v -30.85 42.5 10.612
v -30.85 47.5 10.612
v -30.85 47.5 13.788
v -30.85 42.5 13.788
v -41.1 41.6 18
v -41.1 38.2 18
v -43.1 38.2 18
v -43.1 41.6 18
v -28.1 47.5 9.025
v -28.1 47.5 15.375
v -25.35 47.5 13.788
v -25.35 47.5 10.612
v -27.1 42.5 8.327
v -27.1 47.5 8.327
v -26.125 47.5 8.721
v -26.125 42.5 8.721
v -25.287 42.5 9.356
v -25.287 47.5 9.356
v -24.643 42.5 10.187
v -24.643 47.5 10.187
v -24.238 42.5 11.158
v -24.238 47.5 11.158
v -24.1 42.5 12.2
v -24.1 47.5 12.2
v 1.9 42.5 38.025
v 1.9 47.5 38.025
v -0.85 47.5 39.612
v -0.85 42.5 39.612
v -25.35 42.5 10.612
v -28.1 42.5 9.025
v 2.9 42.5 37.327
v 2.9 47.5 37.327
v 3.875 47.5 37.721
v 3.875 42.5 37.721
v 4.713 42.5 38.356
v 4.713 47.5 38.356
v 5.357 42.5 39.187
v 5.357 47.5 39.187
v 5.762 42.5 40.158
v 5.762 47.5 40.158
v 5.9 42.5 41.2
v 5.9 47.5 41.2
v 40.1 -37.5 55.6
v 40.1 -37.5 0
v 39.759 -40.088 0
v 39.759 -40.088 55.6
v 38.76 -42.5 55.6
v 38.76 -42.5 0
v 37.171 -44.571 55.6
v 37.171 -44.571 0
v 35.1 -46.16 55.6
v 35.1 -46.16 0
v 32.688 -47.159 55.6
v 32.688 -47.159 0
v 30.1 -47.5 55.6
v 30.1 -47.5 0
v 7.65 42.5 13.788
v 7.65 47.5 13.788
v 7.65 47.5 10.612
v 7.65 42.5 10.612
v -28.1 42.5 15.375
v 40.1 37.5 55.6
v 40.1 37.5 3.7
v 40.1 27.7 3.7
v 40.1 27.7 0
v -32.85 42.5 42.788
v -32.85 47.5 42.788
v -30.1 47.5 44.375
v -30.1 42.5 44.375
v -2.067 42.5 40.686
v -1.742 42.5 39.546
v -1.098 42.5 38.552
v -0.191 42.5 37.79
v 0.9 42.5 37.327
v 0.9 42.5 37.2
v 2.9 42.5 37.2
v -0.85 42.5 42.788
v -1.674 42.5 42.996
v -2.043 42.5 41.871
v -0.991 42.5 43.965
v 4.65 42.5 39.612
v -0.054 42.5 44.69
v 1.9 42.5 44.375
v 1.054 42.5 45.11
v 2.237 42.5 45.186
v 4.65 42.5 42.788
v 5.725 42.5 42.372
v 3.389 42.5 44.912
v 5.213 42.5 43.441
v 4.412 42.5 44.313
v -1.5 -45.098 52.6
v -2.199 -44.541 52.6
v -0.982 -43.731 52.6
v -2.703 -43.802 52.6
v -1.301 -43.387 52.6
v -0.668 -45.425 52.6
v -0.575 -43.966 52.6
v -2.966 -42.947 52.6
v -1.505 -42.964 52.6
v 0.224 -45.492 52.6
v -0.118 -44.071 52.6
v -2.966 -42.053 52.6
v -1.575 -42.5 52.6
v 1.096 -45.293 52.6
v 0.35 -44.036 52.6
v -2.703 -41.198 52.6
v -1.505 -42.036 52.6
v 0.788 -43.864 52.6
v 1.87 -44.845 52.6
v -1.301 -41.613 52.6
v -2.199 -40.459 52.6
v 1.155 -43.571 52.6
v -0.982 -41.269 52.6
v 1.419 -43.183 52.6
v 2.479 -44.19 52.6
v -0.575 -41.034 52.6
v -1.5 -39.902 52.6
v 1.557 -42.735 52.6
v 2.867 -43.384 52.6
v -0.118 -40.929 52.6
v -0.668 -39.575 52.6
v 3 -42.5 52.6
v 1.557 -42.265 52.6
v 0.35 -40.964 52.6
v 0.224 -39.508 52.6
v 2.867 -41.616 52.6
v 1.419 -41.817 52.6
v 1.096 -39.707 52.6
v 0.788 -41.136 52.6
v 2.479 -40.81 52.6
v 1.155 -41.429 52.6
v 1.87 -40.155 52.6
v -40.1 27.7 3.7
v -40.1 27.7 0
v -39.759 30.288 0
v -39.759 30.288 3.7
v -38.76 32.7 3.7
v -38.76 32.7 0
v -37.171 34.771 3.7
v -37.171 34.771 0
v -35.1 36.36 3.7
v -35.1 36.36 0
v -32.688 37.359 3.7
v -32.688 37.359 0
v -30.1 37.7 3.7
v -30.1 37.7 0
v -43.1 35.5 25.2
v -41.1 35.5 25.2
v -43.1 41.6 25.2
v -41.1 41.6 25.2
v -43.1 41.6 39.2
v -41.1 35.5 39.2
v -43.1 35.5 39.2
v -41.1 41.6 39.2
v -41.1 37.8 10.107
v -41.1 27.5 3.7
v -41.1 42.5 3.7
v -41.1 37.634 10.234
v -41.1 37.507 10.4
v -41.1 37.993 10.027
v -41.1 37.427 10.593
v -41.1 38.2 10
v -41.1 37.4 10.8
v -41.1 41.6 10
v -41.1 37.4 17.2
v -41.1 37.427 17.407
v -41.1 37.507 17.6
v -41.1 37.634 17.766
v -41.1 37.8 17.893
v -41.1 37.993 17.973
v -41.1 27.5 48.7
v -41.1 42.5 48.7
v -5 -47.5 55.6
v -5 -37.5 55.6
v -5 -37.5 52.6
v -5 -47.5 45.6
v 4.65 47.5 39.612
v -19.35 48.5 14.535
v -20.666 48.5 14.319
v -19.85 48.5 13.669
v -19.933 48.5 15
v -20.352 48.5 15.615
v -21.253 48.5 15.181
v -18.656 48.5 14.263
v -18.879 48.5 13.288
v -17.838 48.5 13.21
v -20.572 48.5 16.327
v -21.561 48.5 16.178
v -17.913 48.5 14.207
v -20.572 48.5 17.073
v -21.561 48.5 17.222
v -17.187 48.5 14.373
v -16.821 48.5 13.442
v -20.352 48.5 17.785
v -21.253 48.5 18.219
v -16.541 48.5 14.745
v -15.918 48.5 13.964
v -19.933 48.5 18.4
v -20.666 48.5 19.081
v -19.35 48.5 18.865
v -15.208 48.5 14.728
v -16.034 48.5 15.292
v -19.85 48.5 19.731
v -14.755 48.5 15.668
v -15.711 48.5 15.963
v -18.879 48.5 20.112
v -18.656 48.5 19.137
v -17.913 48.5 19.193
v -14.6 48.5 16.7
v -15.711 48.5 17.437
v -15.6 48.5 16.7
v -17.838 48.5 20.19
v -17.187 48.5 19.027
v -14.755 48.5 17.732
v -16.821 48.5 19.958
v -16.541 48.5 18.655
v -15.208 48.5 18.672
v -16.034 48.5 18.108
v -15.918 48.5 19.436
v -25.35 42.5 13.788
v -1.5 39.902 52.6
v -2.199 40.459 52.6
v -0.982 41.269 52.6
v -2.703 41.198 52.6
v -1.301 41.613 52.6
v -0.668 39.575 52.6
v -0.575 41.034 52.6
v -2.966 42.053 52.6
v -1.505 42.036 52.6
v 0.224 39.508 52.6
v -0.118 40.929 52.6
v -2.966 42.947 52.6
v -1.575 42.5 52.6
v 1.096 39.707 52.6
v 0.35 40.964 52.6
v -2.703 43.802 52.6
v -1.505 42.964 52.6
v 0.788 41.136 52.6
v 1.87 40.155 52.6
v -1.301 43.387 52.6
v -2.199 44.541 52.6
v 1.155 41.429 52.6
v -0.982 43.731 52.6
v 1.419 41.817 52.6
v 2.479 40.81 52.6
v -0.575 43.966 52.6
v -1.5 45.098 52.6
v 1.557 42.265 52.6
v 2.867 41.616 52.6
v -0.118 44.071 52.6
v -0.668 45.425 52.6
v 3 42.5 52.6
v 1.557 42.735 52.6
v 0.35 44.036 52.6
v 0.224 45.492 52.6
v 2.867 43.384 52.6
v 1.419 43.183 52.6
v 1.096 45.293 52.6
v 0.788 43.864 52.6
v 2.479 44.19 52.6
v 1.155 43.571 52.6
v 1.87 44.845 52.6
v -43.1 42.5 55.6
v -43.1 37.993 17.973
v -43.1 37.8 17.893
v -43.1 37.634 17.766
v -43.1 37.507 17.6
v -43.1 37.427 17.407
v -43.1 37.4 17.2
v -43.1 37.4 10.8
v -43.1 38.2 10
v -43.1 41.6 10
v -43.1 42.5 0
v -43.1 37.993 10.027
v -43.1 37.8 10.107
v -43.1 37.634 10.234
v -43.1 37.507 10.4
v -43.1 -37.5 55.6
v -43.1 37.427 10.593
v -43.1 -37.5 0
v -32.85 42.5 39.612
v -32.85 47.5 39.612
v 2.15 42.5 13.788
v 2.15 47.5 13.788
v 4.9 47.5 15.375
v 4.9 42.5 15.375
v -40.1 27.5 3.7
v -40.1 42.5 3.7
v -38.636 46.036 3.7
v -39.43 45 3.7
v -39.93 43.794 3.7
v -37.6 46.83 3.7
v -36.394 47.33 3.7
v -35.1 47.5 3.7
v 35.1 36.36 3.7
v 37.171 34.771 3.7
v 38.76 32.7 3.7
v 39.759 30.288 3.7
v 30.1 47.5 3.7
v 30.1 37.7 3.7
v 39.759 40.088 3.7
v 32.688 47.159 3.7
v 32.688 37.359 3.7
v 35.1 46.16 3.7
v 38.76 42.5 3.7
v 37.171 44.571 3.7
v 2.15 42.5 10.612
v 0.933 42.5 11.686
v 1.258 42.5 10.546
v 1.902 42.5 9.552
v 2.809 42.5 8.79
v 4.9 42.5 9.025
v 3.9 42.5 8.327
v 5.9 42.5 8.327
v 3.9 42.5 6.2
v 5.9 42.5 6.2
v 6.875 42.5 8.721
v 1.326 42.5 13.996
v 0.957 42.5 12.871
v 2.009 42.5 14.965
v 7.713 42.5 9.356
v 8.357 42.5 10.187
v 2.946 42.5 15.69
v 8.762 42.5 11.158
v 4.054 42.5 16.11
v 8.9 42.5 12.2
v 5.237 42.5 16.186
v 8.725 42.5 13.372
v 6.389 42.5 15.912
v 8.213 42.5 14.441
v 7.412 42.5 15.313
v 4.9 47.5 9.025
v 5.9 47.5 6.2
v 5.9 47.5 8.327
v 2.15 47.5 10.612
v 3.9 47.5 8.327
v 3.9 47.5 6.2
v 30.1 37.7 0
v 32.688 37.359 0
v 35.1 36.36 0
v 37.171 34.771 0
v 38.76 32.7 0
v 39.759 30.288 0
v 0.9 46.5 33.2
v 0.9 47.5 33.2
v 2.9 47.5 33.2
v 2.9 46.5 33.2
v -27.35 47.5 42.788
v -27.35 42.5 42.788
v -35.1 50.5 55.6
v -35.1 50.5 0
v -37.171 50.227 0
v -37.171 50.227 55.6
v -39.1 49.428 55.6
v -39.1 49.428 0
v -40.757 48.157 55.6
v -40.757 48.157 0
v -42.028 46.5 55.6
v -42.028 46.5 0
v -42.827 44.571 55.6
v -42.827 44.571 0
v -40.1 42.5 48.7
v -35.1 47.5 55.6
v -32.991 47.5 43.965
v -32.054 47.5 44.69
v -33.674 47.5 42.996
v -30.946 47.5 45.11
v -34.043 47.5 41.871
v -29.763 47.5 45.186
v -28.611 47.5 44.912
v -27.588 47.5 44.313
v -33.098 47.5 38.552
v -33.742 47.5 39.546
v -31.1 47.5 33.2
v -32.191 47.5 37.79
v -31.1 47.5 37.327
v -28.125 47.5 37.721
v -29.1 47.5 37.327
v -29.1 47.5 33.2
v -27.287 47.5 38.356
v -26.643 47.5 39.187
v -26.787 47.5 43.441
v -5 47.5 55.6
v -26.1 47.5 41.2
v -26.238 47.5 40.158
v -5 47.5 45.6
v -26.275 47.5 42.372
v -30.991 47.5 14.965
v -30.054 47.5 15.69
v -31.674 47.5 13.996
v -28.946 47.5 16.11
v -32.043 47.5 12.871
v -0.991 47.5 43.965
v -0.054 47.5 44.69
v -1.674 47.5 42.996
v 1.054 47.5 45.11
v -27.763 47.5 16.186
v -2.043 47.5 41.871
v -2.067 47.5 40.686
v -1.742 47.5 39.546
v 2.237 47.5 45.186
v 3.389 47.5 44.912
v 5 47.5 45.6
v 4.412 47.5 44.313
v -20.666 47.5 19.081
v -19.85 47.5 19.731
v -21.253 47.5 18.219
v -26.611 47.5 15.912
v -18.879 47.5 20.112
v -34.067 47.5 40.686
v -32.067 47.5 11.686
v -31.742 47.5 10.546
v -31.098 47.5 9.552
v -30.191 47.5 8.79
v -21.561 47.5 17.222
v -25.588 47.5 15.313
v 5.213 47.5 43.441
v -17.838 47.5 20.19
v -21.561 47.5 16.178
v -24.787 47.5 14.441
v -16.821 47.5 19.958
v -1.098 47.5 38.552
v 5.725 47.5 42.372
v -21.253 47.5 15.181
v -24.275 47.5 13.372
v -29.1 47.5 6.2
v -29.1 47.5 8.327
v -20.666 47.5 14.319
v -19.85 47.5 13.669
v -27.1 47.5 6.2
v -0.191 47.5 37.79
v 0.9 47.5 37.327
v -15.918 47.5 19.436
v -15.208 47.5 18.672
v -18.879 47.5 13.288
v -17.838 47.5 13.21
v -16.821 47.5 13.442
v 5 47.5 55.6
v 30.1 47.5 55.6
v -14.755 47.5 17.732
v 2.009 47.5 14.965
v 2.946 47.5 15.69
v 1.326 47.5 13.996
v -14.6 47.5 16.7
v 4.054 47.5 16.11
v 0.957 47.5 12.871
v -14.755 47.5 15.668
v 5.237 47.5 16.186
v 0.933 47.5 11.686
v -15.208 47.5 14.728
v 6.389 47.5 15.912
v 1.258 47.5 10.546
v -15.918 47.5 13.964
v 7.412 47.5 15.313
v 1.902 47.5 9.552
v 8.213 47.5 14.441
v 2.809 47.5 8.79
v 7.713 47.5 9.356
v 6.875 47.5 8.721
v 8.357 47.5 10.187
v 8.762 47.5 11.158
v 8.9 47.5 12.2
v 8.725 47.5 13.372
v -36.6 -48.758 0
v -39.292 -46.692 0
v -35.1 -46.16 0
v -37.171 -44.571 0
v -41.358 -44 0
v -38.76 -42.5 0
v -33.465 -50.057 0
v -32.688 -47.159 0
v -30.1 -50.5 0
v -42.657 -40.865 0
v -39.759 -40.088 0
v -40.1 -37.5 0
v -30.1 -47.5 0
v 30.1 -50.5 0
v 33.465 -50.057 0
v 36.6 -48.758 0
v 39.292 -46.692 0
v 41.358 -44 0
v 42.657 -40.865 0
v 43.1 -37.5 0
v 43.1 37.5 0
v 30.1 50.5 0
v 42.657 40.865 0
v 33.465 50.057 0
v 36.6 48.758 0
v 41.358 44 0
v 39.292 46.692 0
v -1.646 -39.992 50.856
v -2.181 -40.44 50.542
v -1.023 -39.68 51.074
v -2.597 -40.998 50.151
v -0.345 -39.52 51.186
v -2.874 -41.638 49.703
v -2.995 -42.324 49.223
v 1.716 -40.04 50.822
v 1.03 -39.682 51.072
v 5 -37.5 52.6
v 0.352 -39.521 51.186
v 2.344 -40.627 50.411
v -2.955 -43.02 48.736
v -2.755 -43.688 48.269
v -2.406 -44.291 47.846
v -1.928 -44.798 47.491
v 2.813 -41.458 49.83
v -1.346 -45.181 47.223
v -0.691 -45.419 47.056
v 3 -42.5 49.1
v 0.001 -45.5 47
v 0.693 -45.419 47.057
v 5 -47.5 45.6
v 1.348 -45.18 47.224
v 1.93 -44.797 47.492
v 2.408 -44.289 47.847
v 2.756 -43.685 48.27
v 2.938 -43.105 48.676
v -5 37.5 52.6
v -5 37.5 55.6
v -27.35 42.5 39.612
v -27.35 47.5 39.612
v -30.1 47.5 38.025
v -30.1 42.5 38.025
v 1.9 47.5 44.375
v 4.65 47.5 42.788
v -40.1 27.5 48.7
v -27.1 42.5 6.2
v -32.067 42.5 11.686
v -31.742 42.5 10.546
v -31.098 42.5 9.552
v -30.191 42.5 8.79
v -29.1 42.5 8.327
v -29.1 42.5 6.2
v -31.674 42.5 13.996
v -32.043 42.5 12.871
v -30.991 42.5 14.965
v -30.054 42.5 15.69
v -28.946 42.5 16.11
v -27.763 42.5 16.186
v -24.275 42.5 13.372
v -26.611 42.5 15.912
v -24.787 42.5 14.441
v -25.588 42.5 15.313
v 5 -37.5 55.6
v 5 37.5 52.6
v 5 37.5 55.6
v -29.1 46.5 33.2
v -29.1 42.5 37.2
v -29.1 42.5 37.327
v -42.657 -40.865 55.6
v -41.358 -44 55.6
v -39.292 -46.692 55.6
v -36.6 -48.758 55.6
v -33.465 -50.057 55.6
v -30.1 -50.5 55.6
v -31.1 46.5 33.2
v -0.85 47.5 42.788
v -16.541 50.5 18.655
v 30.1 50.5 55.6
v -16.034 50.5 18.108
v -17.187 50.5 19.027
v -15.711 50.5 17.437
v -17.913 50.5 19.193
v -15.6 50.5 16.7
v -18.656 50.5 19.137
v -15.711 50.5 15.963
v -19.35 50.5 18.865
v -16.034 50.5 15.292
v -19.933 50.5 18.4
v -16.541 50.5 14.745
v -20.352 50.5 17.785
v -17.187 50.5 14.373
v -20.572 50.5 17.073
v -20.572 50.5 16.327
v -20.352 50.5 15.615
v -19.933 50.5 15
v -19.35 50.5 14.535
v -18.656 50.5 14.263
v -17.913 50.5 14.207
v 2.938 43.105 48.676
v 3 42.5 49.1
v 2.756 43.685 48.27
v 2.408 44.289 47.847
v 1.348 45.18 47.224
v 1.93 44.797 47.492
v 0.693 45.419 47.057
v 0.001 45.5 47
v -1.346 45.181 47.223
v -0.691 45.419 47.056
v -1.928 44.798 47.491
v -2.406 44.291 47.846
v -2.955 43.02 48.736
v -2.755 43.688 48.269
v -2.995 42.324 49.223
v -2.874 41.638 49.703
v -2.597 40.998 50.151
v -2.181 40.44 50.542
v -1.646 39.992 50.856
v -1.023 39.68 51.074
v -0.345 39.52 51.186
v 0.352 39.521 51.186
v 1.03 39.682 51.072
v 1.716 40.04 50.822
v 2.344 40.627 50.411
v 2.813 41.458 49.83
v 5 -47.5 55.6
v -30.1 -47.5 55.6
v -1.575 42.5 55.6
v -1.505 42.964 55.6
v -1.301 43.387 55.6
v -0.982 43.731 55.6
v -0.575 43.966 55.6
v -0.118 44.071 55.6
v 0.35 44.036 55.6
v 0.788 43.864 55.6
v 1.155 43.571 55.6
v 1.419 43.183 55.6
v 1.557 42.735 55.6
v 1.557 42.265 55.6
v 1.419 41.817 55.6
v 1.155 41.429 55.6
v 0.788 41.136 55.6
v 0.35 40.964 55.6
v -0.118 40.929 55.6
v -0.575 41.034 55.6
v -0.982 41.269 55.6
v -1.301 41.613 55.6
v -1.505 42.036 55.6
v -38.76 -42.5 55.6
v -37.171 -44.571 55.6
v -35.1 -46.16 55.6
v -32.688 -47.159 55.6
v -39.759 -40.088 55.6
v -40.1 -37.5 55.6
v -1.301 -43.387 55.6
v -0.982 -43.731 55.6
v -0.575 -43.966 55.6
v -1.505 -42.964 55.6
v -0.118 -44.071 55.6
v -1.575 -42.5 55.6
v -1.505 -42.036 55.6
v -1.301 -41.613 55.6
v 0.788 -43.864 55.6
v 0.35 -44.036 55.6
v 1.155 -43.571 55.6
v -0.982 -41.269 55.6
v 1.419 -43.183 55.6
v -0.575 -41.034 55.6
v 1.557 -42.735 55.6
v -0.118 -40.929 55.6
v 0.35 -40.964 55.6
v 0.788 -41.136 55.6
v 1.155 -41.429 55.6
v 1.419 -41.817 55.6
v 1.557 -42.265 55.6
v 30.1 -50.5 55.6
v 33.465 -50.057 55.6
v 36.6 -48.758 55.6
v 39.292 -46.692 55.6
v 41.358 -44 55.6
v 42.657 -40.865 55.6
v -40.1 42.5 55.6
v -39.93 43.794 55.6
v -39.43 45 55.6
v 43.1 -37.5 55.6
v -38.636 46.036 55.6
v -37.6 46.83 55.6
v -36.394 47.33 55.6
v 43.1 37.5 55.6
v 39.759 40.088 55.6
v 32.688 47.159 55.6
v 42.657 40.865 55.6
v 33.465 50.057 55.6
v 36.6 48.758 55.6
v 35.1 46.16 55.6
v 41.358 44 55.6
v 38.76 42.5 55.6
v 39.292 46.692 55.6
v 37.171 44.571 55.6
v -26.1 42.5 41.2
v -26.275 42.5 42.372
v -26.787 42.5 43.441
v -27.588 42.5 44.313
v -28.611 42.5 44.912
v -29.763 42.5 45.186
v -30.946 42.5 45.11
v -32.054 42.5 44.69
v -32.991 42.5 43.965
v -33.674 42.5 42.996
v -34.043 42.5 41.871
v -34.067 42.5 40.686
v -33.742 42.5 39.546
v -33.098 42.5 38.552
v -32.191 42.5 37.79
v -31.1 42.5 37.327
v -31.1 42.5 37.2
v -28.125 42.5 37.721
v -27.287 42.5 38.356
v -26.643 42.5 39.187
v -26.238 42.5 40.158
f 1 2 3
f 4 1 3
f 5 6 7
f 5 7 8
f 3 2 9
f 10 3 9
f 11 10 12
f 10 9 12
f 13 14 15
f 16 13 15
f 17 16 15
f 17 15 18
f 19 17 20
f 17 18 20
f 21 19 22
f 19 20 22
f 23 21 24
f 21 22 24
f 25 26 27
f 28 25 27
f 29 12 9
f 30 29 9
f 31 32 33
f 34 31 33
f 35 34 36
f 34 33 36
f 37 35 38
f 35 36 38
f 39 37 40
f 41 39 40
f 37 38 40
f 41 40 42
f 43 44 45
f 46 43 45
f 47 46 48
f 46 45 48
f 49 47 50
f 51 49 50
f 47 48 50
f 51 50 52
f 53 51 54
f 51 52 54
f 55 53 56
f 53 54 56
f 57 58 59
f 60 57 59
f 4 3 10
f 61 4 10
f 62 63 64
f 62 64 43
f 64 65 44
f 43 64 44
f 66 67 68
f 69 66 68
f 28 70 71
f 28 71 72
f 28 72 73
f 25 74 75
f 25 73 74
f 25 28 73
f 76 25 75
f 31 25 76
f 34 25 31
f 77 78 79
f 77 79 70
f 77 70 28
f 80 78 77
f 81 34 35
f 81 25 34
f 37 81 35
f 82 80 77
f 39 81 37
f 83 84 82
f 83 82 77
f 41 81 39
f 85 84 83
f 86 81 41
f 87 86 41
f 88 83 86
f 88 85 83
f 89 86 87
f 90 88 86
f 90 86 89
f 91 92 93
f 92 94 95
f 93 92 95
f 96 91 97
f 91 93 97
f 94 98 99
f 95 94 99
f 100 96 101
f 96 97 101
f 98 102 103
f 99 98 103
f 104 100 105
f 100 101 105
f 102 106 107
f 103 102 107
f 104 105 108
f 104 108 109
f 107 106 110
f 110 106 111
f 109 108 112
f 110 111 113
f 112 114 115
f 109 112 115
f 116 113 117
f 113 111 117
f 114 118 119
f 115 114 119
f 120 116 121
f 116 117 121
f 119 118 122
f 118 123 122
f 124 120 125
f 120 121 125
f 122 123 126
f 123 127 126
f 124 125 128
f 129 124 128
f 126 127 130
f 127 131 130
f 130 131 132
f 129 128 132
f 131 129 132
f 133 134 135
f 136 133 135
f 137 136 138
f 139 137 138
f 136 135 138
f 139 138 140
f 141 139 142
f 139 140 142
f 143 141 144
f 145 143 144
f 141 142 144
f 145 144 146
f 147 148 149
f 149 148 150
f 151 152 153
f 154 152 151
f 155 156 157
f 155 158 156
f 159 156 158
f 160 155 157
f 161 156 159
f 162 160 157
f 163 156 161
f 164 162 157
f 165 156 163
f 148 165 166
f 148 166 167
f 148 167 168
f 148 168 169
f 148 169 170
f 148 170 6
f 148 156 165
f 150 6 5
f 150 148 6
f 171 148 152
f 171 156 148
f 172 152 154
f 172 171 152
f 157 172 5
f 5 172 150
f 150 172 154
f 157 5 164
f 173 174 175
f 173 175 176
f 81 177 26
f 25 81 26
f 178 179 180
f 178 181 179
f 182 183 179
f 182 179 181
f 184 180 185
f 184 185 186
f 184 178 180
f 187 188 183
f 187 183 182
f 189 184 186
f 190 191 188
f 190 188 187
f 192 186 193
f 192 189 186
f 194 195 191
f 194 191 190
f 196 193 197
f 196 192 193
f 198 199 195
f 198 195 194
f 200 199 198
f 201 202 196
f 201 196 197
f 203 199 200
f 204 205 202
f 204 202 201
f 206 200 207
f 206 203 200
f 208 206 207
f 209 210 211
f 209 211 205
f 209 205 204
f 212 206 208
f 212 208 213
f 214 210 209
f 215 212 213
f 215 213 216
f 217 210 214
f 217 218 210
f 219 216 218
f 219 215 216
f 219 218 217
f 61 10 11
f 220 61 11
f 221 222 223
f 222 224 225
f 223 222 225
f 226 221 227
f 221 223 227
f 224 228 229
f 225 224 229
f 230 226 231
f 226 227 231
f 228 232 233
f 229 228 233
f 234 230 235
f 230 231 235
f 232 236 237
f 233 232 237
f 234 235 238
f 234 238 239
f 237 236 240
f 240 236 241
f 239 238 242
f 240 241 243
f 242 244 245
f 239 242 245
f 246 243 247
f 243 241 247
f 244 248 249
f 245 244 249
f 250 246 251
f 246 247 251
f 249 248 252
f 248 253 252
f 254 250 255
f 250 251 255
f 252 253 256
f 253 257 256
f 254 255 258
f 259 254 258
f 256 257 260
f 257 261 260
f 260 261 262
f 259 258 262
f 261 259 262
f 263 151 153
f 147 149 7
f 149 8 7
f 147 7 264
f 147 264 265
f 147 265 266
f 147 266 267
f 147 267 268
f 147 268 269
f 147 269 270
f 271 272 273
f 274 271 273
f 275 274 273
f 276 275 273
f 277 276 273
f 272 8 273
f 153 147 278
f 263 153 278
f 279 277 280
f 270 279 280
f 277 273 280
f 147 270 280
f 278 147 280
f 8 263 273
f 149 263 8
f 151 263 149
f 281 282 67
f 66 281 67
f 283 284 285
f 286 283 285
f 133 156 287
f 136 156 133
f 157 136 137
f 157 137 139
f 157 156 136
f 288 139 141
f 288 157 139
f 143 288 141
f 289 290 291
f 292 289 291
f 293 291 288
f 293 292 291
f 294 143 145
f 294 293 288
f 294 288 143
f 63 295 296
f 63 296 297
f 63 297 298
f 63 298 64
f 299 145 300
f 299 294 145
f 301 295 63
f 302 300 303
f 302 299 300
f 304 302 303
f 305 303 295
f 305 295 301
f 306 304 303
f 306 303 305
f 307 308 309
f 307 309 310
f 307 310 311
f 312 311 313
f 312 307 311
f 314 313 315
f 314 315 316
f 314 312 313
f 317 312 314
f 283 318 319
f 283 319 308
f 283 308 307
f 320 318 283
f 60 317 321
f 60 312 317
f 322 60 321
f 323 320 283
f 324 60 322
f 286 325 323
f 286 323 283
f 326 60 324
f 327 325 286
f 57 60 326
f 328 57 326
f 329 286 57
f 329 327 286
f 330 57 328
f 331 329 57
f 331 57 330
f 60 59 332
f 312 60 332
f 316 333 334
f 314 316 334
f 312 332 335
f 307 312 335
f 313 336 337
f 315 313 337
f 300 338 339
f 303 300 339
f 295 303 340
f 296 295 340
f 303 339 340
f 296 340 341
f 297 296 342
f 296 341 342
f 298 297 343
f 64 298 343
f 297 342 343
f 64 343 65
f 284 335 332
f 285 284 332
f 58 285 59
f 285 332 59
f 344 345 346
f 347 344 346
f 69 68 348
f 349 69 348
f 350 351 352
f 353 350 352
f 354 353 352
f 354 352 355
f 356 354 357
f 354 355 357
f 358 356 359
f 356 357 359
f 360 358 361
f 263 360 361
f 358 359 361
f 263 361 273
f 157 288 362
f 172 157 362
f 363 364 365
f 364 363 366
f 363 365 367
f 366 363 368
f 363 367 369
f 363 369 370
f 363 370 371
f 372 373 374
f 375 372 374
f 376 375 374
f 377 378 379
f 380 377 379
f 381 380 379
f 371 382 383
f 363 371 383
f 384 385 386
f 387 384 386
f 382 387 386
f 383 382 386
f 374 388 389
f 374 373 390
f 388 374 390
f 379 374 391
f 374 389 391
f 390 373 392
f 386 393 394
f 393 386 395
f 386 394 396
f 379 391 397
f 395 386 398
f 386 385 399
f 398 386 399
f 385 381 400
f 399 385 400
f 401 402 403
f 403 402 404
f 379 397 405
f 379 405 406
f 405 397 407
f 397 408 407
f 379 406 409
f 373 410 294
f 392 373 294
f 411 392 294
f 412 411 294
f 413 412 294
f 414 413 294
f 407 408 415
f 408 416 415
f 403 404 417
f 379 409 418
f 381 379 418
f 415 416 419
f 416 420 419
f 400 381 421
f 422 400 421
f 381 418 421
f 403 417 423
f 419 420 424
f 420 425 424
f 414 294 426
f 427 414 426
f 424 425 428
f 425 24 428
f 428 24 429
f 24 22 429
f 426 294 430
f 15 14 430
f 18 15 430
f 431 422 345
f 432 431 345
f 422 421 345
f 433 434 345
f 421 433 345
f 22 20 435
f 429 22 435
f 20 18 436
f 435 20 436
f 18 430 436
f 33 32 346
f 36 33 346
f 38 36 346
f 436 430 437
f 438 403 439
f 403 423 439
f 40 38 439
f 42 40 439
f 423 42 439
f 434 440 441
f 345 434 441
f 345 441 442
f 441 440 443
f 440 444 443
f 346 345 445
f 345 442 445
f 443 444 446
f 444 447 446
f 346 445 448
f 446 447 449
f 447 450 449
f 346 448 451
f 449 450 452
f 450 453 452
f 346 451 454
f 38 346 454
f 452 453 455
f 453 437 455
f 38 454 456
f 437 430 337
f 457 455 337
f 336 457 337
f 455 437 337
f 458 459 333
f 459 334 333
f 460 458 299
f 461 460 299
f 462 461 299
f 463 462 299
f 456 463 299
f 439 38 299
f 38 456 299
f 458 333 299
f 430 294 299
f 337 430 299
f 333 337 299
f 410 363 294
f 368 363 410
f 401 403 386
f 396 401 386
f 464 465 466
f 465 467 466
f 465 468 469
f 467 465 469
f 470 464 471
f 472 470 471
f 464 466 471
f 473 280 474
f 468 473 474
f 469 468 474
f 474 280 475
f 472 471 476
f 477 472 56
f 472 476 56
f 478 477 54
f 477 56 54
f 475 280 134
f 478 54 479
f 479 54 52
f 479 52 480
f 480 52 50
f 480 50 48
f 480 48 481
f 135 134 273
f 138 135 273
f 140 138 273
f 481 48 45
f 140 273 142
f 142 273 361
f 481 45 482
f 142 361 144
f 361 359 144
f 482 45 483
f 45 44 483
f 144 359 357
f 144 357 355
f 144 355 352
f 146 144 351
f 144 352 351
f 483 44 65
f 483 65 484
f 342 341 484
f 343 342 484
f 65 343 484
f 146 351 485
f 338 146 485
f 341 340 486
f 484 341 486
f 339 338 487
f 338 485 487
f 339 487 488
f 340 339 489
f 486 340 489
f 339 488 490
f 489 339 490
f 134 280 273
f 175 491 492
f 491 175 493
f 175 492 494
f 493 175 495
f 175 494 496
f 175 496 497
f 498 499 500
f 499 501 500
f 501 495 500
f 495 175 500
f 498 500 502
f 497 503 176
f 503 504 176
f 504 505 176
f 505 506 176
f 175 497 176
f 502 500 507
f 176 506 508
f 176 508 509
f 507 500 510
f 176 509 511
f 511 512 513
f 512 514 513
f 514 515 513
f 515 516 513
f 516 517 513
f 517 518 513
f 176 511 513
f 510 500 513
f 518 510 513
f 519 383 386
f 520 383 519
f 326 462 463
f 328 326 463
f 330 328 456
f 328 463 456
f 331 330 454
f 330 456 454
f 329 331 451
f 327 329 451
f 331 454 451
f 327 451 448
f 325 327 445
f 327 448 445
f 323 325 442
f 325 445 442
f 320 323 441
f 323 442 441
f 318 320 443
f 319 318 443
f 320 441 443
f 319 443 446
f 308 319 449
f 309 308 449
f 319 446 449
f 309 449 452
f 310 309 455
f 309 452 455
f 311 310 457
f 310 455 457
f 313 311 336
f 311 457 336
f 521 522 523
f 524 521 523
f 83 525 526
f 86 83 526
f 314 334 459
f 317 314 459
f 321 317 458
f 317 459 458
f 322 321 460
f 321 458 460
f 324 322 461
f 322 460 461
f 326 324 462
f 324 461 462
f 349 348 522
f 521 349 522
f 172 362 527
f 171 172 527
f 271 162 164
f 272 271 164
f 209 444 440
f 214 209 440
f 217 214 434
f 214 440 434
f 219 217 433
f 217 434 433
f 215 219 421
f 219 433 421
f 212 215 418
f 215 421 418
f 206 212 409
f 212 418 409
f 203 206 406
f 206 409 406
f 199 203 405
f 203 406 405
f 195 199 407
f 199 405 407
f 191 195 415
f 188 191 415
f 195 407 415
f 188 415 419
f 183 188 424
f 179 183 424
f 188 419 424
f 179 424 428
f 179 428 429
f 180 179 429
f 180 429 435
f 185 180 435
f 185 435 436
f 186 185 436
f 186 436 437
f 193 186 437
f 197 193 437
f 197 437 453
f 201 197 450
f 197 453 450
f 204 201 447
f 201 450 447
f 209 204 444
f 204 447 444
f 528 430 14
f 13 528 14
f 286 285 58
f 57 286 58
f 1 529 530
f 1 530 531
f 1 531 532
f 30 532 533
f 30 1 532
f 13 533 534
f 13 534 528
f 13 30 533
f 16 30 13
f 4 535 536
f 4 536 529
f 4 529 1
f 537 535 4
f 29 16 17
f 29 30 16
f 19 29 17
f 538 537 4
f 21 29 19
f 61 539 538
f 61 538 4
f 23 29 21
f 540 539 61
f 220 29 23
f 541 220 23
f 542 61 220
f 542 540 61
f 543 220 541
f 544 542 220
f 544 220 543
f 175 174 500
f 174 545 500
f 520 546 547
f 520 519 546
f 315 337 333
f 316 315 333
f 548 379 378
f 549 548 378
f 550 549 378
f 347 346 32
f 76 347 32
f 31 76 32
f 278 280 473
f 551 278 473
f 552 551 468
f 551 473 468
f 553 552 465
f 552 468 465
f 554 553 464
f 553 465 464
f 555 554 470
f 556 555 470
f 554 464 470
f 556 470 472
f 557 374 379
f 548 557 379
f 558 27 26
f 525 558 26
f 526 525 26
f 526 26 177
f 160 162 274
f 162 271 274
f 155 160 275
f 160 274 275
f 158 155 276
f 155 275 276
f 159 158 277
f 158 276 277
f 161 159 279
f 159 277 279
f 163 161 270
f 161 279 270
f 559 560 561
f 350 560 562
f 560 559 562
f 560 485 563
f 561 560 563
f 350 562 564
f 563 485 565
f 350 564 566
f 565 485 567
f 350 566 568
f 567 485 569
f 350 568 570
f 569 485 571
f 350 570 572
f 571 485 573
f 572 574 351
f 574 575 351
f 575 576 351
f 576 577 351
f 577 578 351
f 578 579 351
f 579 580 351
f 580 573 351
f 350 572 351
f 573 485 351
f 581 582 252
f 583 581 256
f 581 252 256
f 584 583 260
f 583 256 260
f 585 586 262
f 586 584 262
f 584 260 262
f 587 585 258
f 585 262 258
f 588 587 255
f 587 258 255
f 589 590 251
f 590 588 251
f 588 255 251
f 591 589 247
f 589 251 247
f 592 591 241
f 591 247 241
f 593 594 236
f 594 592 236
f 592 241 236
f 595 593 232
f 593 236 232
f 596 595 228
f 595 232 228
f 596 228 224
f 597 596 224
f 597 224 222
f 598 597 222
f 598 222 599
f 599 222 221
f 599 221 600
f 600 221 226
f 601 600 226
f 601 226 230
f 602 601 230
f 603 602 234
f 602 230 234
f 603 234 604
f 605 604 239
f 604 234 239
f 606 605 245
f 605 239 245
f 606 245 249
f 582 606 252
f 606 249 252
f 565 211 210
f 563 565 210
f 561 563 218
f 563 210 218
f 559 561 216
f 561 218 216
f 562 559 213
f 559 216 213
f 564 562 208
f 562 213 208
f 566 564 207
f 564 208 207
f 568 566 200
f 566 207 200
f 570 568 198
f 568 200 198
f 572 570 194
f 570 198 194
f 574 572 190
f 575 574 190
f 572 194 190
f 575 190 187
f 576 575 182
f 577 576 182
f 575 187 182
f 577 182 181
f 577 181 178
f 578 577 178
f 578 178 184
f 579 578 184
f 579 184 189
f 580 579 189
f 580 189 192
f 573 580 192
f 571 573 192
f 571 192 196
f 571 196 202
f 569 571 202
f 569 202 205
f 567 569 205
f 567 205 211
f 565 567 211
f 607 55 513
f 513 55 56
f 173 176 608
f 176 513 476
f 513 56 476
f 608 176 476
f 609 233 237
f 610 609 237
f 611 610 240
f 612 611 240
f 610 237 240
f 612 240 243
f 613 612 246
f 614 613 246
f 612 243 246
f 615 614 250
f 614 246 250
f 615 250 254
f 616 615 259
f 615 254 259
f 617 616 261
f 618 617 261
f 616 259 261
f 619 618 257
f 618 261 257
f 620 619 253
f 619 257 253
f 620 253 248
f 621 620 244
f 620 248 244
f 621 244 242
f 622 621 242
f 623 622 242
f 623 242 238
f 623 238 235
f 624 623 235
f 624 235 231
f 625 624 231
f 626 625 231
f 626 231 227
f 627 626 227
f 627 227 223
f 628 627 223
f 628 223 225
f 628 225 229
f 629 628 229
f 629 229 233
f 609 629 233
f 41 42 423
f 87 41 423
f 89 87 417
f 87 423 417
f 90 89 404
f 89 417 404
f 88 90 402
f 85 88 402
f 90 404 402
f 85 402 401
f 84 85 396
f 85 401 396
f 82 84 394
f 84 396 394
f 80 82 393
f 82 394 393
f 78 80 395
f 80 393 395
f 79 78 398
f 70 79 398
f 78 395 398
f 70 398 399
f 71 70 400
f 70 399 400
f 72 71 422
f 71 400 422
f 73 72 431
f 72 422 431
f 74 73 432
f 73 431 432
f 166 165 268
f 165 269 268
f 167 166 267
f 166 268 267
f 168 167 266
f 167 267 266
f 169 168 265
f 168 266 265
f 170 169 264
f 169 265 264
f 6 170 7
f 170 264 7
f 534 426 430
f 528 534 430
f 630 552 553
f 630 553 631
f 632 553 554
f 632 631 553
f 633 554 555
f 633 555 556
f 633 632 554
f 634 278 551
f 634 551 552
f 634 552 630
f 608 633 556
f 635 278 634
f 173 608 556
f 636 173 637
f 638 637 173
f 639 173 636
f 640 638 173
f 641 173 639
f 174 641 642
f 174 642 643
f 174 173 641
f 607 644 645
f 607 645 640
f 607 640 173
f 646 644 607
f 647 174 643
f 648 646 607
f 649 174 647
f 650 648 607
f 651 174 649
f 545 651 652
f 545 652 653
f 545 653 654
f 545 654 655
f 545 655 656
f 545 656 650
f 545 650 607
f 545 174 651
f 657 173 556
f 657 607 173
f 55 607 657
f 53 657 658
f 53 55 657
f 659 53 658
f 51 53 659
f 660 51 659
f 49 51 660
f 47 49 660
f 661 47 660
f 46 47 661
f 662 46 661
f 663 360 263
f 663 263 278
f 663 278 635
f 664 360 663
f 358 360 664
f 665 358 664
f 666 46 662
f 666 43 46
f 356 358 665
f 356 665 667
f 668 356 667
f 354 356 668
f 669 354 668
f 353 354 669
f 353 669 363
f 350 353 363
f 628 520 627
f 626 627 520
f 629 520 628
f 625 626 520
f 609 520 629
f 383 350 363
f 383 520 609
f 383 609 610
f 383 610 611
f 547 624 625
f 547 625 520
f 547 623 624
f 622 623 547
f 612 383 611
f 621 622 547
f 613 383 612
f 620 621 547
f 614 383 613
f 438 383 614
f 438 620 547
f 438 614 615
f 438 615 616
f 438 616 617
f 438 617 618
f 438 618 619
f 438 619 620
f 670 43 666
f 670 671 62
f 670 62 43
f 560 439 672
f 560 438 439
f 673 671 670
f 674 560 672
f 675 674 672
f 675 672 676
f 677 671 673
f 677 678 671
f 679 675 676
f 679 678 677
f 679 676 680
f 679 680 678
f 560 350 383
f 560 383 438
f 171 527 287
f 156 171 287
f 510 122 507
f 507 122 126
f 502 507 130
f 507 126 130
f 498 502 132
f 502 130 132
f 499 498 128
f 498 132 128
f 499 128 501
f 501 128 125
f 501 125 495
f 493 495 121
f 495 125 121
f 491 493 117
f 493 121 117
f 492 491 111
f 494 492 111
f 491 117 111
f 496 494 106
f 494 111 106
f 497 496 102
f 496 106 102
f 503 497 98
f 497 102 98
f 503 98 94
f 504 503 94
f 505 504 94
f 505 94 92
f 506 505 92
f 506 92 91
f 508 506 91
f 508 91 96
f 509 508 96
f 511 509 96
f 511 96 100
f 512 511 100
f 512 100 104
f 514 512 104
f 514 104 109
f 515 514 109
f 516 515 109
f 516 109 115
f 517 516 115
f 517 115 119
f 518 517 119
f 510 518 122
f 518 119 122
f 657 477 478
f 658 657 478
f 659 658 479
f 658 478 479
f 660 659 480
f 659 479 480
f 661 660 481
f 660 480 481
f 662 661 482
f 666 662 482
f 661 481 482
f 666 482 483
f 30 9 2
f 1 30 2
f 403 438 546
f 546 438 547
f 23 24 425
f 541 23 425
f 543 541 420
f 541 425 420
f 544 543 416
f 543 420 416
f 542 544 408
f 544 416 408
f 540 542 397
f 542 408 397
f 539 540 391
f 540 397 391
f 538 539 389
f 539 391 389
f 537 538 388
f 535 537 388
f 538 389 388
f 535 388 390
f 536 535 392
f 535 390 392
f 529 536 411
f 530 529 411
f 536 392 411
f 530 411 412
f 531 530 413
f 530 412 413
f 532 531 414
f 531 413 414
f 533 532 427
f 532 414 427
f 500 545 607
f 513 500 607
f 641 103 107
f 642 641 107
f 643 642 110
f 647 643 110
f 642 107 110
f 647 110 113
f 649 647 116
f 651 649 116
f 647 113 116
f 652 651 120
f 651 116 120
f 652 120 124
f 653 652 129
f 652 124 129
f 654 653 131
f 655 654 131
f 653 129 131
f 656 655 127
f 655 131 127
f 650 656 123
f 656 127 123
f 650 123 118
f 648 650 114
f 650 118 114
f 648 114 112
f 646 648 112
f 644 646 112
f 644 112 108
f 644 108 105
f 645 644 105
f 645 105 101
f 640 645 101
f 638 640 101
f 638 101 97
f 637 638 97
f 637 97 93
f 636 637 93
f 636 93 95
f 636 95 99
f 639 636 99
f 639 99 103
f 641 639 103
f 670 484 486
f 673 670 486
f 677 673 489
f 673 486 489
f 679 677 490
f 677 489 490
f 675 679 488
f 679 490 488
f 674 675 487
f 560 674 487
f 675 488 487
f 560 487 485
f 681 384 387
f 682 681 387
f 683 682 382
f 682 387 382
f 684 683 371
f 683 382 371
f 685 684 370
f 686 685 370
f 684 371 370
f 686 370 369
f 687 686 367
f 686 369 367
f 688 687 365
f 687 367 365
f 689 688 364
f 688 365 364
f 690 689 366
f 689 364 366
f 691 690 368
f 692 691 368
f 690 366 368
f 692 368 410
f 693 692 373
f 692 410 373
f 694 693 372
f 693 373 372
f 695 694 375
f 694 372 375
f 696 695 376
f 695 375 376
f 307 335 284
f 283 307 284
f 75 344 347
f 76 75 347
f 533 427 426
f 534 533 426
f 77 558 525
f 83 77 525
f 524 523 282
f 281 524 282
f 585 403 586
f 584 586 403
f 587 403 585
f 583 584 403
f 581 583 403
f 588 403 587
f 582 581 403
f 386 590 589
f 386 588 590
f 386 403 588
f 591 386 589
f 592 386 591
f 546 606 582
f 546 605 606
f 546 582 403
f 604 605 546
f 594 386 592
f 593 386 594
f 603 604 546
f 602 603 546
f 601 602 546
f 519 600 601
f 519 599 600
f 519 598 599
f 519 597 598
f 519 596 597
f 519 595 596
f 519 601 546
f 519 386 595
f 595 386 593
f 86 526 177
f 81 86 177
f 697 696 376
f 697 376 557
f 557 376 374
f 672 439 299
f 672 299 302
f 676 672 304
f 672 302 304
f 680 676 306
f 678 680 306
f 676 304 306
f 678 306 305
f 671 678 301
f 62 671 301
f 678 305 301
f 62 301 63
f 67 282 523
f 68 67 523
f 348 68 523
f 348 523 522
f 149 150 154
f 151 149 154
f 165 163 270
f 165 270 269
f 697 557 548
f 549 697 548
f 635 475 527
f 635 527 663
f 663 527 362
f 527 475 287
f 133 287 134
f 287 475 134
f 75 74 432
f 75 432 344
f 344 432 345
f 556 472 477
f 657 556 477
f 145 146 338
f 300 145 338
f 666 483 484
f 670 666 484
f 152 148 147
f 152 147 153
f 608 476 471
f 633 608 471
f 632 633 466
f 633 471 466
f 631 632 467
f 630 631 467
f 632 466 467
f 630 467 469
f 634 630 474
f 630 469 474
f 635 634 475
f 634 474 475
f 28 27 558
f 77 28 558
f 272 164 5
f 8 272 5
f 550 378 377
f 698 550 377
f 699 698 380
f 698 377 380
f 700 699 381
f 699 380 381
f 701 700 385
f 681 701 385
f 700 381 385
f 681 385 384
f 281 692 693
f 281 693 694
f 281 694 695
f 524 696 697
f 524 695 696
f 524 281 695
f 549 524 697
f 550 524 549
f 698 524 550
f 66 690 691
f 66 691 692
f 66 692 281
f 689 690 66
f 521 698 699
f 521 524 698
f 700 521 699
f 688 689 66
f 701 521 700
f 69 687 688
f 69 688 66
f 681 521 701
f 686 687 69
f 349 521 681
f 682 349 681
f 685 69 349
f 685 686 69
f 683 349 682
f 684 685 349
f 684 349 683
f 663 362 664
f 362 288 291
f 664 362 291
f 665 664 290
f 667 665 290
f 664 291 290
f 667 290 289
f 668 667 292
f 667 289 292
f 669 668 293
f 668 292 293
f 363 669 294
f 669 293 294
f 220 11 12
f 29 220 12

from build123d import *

# Parameters (mm, degrees)
F1_DEPTH  = 3.7
F2_DEPTH  = 55.6
F5_DEPTH  = 5
F7_D      = 3.15
F7_DEPTH  = 10
F7_TIP    = 0.946355475
F9_R      = 3
F10_DEPTH = 10
F12_DEPTH = 5
F11_R     = 2.5
F13_DEPTH = 25
F11_R_2   = 3.5
F14_DEPTH = 1
F15_SIZE  = 4
F16_W     = 4.2
F16_H     = 8
F16_W_2   = 6.1
F16_H_2   = 14
F17_DEPTH = 1
F18_DEPTH = 3
F19_R     = 0.8


with BuildPart() as f1:
    # F0 (on Top) → F1 (new body)
    with BuildSketch(Plane.XY):
        with BuildLine():
            ThreePointArc((43.1, 37.5), (39.2923881554, 46.6923881554), (30.1, 50.5))
            Line((30.1, 50.5), (-35.1, 50.5))
            ThreePointArc((-35.1, 50.5), (-40.7568542495, 48.1568542495), (-43.1, 42.5))
            Line((-43.1, 42.5), (-43.1, -37.5))
            ThreePointArc((-43.1, -37.5), (-39.2923881554, -46.6923881554), (-30.1, -50.5))
            Line((-30.1, -50.5), (30.1, -50.5))
            ThreePointArc((30.1, -50.5), (39.2923881554, -46.6923881554), (43.1, -37.5))
            Line((43.1, -37.5), (43.1, 37.5))
        make_face()
        with BuildLine():
            Line((40.1, 37.5), (40.1, 27.7))
            Line((40.1, 27.7), (40.1, -37.5))
            ThreePointArc((40.1, -37.5), (37.1710678119, -44.5710678119), (30.1, -47.5))
            Line((30.1, -47.5), (-30.1, -47.5))
            ThreePointArc((-30.1, -47.5), (-37.1710678119, -44.5710678119), (-40.1, -37.5))
            Line((-40.1, -37.5), (-40.1, 27.7))
            Line((-40.1, 27.7), (-40.1, 42.5))
            ThreePointArc((-40.1, 42.5), (-38.6355339059, 46.0355339059), (-35.1, 47.5))
            Line((-35.1, 47.5), (30.1, 47.5))
            ThreePointArc((30.1, 47.5), (37.1710678119, 44.5710678119), (40.1, 37.5))
        make_face(mode=Mode.SUBTRACT)
        with BuildLine():
            Line((-30.1, 37.7), (30.1, 37.7))
            ThreePointArc((30.1, 37.7), (37.1710678119, 34.7710678119), (40.1, 27.7))
            Line((40.1, 27.7), (40.1, 37.5))
            ThreePointArc((40.1, 37.5), (37.1710678119, 44.5710678119), (30.1, 47.5))
            Line((30.1, 47.5), (-35.1, 47.5))
            ThreePointArc((-35.1, 47.5), (-38.6355339059, 46.0355339059), (-40.1, 42.5))
            Line((-40.1, 42.5), (-40.1, 27.7))
            ThreePointArc((-40.1, 27.7), (-37.1710678119, 34.7710678119), (-30.1, 37.7))
        make_face()
    extrude(amount=F1_DEPTH)

    # F0 (on Top) → F2 (join)
    with BuildSketch(Plane.XY):
        with BuildLine():
            ThreePointArc((43.1, 37.5), (39.2923881554, 46.6923881554), (30.1, 50.5))
            Line((30.1, 50.5), (-35.1, 50.5))
            ThreePointArc((-35.1, 50.5), (-40.7568542495, 48.1568542495), (-43.1, 42.5))
            Line((-43.1, 42.5), (-43.1, -37.5))
            ThreePointArc((-43.1, -37.5), (-39.2923881554, -46.6923881554), (-30.1, -50.5))
            Line((-30.1, -50.5), (30.1, -50.5))
            ThreePointArc((30.1, -50.5), (39.2923881554, -46.6923881554), (43.1, -37.5))
            Line((43.1, -37.5), (43.1, 37.5))
        make_face()
        with BuildLine():
            Line((40.1, 37.5), (40.1, 27.7))
            Line((40.1, 27.7), (40.1, -37.5))
            ThreePointArc((40.1, -37.5), (37.1710678119, -44.5710678119), (30.1, -47.5))
            Line((30.1, -47.5), (-30.1, -47.5))
            ThreePointArc((-30.1, -47.5), (-37.1710678119, -44.5710678119), (-40.1, -37.5))
            Line((-40.1, -37.5), (-40.1, 27.7))
            Line((-40.1, 27.7), (-40.1, 42.5))
            ThreePointArc((-40.1, 42.5), (-38.6355339059, 46.0355339059), (-35.1, 47.5))
            Line((-35.1, 47.5), (30.1, 47.5))
            ThreePointArc((30.1, 47.5), (37.1710678119, 44.5710678119), (40.1, 37.5))
        make_face(mode=Mode.SUBTRACT)
    extrude(amount=F2_DEPTH)

    # F4 (on offset) → F5 (join, symmetric)
    with BuildSketch(Plane(origin=(0, 0, 0), x_dir=(0, -1, 0), z_dir=(-1, 0, 0))):
        Polygon((47.5, 45.6), (47.5, 55.6), (37.5, 55.6), (37.5, 52.6), align=None)
        Polygon((-37.5, 52.6), (-37.5, 55.6), (-47.5, 55.6), (-47.5, 45.6), align=None)
    extrude(amount=F5_DEPTH, both=True)

    # F7
    with Locations(Plane.XY.offset(55.6)):
        with Locations((0, 42.5), (0, -42.5)):
            Hole(F7_D / 2, depth=F7_DEPTH)
            with Locations((0, 0, -(F7_DEPTH + F7_TIP / 2))):  # 118° drill point
                Cone(0, F7_D / 2, F7_TIP, mode=Mode.SUBTRACT)

    # F9 (on offset) → F10 (cut)
    with BuildSketch(Plane.XY.offset(52.6)):
        with Locations((0, 42.5)):
            Circle(F9_R)
        with Locations((0, -42.5)):
            Circle(F9_R)
    extrude(amount=-F10_DEPTH, mode=Mode.SUBTRACT)

    # F11 (on face) → F12 (join)
    with BuildSketch(Plane.XZ.offset(-47.5)):
        with BuildLine():
            ThreePointArc((-29.1, 37.3270166538), (-26.9377223398, 38.7505102572), (-26.1, 41.2))
            ThreePointArc((-26.1, 41.2), (-32.5494897428, 44.3622776602), (-31.1, 37.3270166538))
            ThreePointArc((-31.1, 37.3270166538), (-30.1, 37.2), (-29.1, 37.3270166538))
        make_face()
        Polygon((-30.1, 44.3754264805), (-27.35, 42.7877132403), (-27.35, 39.6122867597), (-30.1, 38.0245735195), (-32.85, 39.6122867597), (-32.85, 42.7877132403), align=None, mode=Mode.SUBTRACT)
        with BuildLine():
            ThreePointArc((-29.1, 37.3270166538), (-30.1, 37.2), (-31.1, 37.3270166538))
            Line((-31.1, 37.3270166538), (-31.1, 33.2))
            Line((-31.1, 33.2), (-29.1, 33.2))
            Line((-29.1, 33.2), (-29.1, 37.3270166538))
        make_face()
        with BuildLine():
            ThreePointArc((2.9, 37.3270166538), (5.0622776602, 38.7505102572), (5.9, 41.2))
            ThreePointArc((5.9, 41.2), (-0.5494897428, 44.3622776602), (0.9, 37.3270166538))
            ThreePointArc((0.9, 37.3270166538), (1.9, 37.2), (2.9, 37.3270166538))
        make_face()
        Polygon((1.9, 44.3754264805), (4.65, 42.7877132403), (4.65, 39.6122867597), (1.9, 38.0245735195), (-0.85, 39.6122867597), (-0.85, 42.7877132403), align=None, mode=Mode.SUBTRACT)
        with BuildLine():
            ThreePointArc((2.9, 37.3270166538), (1.9, 37.2), (0.9, 37.3270166538))
            Line((0.9, 37.3270166538), (0.9, 33.2))
            Line((0.9, 33.2), (2.9, 33.2))
            Line((2.9, 33.2), (2.9, 37.3270166538))
        make_face()
        with BuildLine():
            ThreePointArc((-27.1, 8.3270166538), (-24.9377223398, 9.7505102572), (-24.1, 12.2))
            ThreePointArc((-24.1, 12.2), (-30.5494897428, 15.3622776602), (-29.1, 8.3270166538))
            ThreePointArc((-29.1, 8.3270166538), (-28.1, 8.2), (-27.1, 8.3270166538))
        make_face()
        Polygon((-28.1, 15.3754264805), (-25.35, 13.7877132403), (-25.35, 10.6122867597), (-28.1, 9.0245735195), (-30.85, 10.6122867597), (-30.85, 13.7877132403), align=None, mode=Mode.SUBTRACT)
        with BuildLine():
            ThreePointArc((-27.1, 8.3270166538), (-28.1, 8.2), (-29.1, 8.3270166538))
            Line((-29.1, 8.3270166538), (-29.1, 6.2))
            Line((-29.1, 6.2), (-27.1, 6.2))
            Line((-27.1, 6.2), (-27.1, 8.3270166538))
        make_face()
        with BuildLine():
            ThreePointArc((5.9, 8.3270166538), (8.0622776602, 9.7505102572), (8.9, 12.2))
            ThreePointArc((8.9, 12.2), (2.4505102572, 15.3622776602), (3.9, 8.3270166538))
            ThreePointArc((3.9, 8.3270166538), (4.9, 8.2), (5.9, 8.3270166538))
        make_face()
        Polygon((4.9, 15.3754264805), (7.65, 13.7877132403), (7.65, 10.6122867597), (4.9, 9.0245735195), (2.15, 10.6122867597), (2.15, 13.7877132403), align=None, mode=Mode.SUBTRACT)
        with BuildLine():
            ThreePointArc((5.9, 8.3270166538), (4.9, 8.2), (3.9, 8.3270166538))
            Line((3.9, 8.3270166538), (3.9, 6.2))
            Line((3.9, 6.2), (5.9, 6.2))
            Line((5.9, 6.2), (5.9, 8.3270166538))
        make_face()
    extrude(amount=F12_DEPTH)

    # F11 (on face) → F13 (cut)
    with BuildSketch(Plane.XZ.offset(-47.5)):
        with Locations((-18.1, 16.7)):
            Circle(F11_R)
    extrude(amount=-F13_DEPTH, mode=Mode.SUBTRACT)

    # F11 (on face) → F14 (cut)
    with BuildSketch(Plane.XZ.offset(-47.5)):
        with Locations((-18.1, 16.7)):
            Circle(F11_R_2)
        with Locations((-18.1, 16.7)):
            Circle(F11_R, mode=Mode.SUBTRACT)
        with Locations((-18.1, 16.7)):
            Circle(F11_R)
    extrude(amount=-F14_DEPTH, mode=Mode.SUBTRACT)

    # F15
    f15_edges = [f1.edges().sort_by_distance(p)[0] for p in [
        (1.9, 42.5, 33.2),
        (-30.1, 42.5, 33.2),
    ]]
    chamfer(f15_edges, length=F15_SIZE)

    # F16 (on face) → F17 (cut)
    with BuildSketch(Plane.YZ.offset(-40.1)):
        Polygon((27.7, 3.7), (42.5, 3.7), (42.5, 48.7), (27.5, 48.7), (27.5, 3.7), align=None)
        with Locations((39.5, 14)):
            Rectangle(F16_W, F16_H, mode=Mode.SUBTRACT)
        with Locations((38.55, 32.2)):
            Rectangle(F16_W_2, F16_H_2, mode=Mode.SUBTRACT)
    extrude(amount=-F17_DEPTH, mode=Mode.SUBTRACT)

    # F16 (on face) → F18 (cut)
    with BuildSketch(Plane.YZ.offset(-40.1)):
        with Locations((38.55, 32.2)):
            Rectangle(F16_W_2, F16_H_2)
        with Locations((39.5, 14)):
            Rectangle(F16_W, F16_H)
    extrude(amount=-F18_DEPTH, mode=Mode.SUBTRACT)

    # F19
    f19_edges = [f1.edges().sort_by_distance(p)[0] for p in [
        (-42.1, 37.4, 18),
        (-42.1, 37.4, 10),
    ]]
    fillet(f19_edges, radius=F19_R)


solid = f1.part
